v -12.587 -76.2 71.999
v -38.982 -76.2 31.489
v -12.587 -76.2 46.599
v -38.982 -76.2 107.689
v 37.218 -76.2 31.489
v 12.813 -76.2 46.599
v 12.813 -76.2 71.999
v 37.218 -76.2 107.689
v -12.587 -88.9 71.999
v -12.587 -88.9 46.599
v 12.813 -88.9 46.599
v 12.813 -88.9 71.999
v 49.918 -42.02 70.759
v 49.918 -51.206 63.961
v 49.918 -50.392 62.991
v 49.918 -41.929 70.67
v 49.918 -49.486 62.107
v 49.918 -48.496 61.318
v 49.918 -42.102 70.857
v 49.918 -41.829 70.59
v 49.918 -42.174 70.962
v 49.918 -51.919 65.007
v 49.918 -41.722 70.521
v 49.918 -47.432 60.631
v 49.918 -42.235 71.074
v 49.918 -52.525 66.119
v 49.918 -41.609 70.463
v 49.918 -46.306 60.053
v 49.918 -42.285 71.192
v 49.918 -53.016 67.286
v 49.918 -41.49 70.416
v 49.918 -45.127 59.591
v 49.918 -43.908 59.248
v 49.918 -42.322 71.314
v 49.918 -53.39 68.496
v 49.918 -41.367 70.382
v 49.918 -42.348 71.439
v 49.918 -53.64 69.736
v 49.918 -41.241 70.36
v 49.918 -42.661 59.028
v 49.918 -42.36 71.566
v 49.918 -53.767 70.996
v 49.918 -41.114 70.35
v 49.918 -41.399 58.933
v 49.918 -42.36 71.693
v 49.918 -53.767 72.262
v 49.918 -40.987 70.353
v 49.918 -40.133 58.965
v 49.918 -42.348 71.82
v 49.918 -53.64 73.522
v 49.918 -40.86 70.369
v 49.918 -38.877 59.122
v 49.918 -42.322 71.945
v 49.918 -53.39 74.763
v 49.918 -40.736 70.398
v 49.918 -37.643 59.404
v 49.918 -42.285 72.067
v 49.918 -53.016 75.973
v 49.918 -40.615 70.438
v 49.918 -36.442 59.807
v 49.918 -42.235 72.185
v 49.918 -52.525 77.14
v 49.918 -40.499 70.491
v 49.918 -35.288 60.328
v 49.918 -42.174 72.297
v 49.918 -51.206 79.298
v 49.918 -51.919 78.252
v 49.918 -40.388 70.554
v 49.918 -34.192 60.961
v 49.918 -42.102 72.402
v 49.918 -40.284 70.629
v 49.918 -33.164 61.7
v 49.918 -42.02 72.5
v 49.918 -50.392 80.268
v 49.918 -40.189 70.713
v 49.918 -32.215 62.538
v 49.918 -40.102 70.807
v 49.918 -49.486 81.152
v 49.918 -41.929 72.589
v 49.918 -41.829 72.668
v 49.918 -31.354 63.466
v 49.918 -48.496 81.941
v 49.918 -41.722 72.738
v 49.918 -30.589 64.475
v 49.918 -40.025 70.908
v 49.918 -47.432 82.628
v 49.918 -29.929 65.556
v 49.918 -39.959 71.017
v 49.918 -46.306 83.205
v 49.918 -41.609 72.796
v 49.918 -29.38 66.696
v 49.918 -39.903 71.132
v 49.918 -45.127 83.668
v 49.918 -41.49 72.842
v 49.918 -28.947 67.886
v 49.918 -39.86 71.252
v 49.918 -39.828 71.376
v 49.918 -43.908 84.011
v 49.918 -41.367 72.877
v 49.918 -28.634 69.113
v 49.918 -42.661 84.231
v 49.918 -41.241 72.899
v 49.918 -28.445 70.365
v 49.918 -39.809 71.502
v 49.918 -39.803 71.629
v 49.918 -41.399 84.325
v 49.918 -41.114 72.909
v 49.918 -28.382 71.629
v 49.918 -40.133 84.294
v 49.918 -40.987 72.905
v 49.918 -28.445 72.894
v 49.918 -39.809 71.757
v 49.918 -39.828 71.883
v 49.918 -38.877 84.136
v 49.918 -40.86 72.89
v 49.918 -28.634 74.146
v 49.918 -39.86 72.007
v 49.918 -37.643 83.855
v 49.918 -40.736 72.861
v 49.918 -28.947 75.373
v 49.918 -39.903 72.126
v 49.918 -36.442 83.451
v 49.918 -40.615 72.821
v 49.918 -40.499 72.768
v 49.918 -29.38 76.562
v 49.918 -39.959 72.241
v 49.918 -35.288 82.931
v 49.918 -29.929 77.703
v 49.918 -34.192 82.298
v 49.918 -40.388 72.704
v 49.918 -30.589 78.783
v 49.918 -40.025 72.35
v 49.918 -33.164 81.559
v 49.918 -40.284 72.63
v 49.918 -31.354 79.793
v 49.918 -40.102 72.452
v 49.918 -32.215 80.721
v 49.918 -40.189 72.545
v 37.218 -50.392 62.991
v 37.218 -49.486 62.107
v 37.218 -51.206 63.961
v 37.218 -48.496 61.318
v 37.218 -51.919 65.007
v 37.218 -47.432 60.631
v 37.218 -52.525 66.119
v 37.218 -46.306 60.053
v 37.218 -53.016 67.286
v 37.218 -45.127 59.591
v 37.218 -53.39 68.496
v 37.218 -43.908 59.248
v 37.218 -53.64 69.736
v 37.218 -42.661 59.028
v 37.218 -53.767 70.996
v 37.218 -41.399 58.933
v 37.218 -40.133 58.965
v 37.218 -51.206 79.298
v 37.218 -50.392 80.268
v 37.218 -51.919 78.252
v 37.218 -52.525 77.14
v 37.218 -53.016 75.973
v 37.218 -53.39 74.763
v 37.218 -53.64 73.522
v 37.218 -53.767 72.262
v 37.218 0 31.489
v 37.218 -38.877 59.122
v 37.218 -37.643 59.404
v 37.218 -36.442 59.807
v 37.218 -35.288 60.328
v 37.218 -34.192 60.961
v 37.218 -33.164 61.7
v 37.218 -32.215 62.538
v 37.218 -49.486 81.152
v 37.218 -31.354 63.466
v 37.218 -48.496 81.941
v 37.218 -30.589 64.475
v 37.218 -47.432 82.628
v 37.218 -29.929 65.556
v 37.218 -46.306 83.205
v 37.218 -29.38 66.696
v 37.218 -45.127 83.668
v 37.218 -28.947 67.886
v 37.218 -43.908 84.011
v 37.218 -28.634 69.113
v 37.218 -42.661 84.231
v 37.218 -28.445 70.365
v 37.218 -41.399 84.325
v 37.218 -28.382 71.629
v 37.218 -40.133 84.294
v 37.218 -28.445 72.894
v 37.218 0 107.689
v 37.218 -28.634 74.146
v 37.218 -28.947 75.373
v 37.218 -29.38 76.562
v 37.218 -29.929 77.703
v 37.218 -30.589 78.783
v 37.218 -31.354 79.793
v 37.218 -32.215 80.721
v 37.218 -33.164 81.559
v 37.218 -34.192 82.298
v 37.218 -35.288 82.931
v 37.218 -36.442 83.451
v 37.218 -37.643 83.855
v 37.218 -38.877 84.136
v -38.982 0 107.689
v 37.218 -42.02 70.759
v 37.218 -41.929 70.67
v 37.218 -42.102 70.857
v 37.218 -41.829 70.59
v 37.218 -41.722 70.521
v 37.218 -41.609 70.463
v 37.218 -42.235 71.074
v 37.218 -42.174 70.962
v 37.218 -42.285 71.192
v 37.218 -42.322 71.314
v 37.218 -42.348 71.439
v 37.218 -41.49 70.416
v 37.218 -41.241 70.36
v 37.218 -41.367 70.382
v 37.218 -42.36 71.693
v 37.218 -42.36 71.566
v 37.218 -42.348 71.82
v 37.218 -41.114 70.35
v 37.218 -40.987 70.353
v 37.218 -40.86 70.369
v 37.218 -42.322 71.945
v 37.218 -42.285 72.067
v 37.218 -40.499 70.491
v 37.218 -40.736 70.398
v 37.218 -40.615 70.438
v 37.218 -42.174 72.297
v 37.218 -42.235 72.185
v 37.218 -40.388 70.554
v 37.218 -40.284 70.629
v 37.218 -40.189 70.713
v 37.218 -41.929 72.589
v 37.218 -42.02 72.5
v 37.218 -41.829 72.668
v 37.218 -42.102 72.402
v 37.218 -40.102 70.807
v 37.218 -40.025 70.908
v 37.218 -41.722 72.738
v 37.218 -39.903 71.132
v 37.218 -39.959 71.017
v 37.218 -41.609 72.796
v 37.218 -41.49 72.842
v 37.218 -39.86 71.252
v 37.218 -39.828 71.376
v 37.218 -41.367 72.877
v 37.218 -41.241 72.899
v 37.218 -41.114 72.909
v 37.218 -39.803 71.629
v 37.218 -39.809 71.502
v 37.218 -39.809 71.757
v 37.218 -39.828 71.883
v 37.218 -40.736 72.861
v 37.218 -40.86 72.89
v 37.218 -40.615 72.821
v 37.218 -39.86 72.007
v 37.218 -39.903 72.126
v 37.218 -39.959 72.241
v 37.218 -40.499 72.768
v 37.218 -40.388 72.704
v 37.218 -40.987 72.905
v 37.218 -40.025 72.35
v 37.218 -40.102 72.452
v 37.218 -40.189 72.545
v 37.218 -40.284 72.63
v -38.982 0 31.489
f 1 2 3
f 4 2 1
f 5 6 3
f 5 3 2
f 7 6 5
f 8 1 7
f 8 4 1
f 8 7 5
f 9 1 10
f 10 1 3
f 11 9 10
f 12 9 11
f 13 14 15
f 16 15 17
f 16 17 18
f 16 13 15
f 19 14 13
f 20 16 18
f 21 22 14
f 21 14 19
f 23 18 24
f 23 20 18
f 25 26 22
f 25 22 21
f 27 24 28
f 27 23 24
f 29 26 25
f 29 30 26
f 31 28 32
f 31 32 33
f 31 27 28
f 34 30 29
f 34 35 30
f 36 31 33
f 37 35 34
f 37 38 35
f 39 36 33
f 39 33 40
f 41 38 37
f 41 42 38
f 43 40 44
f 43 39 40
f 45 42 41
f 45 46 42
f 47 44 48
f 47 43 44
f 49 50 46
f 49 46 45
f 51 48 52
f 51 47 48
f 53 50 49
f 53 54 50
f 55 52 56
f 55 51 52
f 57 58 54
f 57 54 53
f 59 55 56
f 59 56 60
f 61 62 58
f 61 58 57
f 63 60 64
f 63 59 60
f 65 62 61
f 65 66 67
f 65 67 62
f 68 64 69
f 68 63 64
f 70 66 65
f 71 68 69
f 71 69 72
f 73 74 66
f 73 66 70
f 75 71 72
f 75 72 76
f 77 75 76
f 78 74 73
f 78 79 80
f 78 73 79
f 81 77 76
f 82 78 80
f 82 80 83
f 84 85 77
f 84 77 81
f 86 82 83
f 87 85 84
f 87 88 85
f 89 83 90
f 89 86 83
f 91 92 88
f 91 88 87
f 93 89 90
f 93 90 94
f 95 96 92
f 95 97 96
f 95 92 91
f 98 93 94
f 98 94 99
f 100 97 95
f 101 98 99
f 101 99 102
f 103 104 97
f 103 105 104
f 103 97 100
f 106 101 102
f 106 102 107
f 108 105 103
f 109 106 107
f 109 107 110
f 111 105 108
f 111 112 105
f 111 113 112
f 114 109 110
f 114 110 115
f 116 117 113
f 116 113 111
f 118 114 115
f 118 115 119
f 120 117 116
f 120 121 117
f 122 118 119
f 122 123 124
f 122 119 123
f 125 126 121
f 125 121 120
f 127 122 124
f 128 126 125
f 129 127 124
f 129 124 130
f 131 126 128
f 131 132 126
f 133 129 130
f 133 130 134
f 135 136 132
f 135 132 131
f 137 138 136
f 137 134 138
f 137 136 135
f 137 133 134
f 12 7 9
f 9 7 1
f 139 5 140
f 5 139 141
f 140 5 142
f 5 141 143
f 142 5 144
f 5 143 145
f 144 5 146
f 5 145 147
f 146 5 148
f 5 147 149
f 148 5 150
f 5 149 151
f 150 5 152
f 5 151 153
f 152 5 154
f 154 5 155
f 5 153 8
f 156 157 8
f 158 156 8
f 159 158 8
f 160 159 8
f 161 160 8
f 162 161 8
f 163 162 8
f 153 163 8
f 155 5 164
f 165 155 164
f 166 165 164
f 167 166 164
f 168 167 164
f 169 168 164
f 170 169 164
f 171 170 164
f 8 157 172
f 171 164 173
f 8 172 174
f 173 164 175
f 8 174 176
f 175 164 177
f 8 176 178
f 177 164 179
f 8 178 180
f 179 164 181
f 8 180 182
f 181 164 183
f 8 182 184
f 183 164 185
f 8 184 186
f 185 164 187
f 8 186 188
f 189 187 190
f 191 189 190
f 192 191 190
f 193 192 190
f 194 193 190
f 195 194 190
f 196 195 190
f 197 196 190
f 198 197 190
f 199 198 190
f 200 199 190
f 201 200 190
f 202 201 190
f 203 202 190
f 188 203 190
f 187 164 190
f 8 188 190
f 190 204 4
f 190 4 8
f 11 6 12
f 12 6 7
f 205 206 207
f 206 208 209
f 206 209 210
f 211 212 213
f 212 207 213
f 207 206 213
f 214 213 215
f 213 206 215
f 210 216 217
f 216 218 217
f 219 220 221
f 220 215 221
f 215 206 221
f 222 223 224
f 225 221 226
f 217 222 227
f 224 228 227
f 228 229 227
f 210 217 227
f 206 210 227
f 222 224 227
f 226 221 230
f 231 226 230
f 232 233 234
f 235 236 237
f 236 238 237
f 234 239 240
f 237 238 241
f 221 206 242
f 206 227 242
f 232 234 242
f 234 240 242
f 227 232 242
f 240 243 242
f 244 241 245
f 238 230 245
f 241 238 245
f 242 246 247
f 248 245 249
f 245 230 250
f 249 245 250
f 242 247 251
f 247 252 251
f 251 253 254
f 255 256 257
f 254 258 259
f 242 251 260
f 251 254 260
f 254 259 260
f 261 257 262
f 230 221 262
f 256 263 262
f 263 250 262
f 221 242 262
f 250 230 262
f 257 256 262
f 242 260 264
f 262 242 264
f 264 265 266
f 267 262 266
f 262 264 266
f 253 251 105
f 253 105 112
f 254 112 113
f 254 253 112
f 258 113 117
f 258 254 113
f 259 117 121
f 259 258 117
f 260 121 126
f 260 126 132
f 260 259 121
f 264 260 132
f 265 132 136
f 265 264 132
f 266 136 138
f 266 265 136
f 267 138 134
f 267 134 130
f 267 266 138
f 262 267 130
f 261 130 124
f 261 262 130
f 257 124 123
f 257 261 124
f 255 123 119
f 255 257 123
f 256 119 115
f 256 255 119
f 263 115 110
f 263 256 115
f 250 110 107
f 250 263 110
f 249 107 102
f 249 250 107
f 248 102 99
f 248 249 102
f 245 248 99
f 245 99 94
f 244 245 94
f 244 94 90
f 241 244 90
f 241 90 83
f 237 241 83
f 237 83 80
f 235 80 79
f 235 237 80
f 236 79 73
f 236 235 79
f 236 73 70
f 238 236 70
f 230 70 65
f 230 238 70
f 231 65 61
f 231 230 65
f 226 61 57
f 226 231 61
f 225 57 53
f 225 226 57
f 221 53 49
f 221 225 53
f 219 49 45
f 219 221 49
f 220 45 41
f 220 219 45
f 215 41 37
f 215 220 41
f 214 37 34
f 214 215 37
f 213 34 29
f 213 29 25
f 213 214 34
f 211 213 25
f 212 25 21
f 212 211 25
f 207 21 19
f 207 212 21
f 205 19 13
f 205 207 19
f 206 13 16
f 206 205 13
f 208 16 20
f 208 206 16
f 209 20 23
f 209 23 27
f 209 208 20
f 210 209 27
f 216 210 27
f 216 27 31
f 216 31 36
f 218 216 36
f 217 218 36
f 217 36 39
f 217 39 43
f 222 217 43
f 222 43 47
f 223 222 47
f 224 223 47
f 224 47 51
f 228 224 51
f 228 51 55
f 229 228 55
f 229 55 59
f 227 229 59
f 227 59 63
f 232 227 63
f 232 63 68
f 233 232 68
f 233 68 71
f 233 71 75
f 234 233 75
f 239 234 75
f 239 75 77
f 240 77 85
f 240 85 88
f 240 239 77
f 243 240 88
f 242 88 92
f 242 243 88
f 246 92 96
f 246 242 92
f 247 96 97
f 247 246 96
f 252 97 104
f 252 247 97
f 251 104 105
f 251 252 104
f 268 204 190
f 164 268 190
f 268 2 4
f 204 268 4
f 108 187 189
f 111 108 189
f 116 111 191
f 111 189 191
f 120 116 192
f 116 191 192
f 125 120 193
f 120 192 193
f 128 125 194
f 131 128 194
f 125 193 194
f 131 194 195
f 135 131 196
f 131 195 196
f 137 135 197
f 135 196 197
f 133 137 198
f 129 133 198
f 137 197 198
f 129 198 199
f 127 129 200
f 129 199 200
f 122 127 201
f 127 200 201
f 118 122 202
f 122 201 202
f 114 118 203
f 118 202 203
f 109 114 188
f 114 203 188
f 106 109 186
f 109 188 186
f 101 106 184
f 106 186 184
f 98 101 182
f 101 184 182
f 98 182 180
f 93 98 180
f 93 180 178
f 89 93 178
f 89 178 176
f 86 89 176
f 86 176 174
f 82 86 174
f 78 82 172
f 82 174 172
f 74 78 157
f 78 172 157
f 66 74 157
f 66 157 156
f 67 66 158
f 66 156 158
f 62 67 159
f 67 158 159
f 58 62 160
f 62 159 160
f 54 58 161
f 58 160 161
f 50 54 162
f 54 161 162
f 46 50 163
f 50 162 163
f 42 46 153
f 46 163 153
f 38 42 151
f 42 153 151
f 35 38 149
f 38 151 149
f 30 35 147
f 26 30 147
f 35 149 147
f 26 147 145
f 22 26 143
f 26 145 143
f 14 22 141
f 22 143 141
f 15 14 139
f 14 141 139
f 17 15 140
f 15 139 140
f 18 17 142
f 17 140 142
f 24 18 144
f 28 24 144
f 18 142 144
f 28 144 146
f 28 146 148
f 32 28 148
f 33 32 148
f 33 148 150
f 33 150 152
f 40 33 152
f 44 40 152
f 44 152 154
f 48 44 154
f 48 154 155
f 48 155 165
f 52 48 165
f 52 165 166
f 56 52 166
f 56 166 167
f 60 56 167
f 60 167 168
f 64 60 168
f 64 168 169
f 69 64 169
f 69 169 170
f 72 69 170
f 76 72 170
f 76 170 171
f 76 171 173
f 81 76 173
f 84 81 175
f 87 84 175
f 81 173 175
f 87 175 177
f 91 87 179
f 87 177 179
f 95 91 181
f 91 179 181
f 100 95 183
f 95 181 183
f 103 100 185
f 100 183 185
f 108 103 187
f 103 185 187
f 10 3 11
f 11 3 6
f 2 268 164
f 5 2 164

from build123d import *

# Parameters (mm, degrees)
F0_W     = 76.2
F0_H     = 76.2
F1_DEPTH = 76.2
F3_DEPTH = 12.7
F4_R     = 12.7
F4_R_2   = 1.279646
F5_DEPTH = 12.7


with BuildPart() as f1:
    # F0 (on Front) → F1 (new body)
    with BuildSketch(Plane.XZ):
        with Locations((-0.882402, 69.589193)):
            Rectangle(F0_W, F0_H)
    extrude(amount=F1_DEPTH)

    # F2 (on face) → F3 (join)
    with BuildSketch(Plane.XZ.offset(76.2)):
        Polygon((0.113132, 71.998739), (-12.586868, 71.998739), (-12.586868, 46.598739), (12.813132, 46.598739), (12.813132, 71.998739), align=None)
    extrude(amount=F3_DEPTH)

    # F4 (on face) → F5 (join)
    with BuildSketch(Plane.YZ.offset(37.217598)):
        with Locations((-41.082326, 71.629331)):
            Circle(F4_R)
        with Locations((-41.082326, 71.629331)):
            Circle(F4_R_2, mode=Mode.SUBTRACT)
    extrude(amount=F5_DEPTH)


solid = f1.part
